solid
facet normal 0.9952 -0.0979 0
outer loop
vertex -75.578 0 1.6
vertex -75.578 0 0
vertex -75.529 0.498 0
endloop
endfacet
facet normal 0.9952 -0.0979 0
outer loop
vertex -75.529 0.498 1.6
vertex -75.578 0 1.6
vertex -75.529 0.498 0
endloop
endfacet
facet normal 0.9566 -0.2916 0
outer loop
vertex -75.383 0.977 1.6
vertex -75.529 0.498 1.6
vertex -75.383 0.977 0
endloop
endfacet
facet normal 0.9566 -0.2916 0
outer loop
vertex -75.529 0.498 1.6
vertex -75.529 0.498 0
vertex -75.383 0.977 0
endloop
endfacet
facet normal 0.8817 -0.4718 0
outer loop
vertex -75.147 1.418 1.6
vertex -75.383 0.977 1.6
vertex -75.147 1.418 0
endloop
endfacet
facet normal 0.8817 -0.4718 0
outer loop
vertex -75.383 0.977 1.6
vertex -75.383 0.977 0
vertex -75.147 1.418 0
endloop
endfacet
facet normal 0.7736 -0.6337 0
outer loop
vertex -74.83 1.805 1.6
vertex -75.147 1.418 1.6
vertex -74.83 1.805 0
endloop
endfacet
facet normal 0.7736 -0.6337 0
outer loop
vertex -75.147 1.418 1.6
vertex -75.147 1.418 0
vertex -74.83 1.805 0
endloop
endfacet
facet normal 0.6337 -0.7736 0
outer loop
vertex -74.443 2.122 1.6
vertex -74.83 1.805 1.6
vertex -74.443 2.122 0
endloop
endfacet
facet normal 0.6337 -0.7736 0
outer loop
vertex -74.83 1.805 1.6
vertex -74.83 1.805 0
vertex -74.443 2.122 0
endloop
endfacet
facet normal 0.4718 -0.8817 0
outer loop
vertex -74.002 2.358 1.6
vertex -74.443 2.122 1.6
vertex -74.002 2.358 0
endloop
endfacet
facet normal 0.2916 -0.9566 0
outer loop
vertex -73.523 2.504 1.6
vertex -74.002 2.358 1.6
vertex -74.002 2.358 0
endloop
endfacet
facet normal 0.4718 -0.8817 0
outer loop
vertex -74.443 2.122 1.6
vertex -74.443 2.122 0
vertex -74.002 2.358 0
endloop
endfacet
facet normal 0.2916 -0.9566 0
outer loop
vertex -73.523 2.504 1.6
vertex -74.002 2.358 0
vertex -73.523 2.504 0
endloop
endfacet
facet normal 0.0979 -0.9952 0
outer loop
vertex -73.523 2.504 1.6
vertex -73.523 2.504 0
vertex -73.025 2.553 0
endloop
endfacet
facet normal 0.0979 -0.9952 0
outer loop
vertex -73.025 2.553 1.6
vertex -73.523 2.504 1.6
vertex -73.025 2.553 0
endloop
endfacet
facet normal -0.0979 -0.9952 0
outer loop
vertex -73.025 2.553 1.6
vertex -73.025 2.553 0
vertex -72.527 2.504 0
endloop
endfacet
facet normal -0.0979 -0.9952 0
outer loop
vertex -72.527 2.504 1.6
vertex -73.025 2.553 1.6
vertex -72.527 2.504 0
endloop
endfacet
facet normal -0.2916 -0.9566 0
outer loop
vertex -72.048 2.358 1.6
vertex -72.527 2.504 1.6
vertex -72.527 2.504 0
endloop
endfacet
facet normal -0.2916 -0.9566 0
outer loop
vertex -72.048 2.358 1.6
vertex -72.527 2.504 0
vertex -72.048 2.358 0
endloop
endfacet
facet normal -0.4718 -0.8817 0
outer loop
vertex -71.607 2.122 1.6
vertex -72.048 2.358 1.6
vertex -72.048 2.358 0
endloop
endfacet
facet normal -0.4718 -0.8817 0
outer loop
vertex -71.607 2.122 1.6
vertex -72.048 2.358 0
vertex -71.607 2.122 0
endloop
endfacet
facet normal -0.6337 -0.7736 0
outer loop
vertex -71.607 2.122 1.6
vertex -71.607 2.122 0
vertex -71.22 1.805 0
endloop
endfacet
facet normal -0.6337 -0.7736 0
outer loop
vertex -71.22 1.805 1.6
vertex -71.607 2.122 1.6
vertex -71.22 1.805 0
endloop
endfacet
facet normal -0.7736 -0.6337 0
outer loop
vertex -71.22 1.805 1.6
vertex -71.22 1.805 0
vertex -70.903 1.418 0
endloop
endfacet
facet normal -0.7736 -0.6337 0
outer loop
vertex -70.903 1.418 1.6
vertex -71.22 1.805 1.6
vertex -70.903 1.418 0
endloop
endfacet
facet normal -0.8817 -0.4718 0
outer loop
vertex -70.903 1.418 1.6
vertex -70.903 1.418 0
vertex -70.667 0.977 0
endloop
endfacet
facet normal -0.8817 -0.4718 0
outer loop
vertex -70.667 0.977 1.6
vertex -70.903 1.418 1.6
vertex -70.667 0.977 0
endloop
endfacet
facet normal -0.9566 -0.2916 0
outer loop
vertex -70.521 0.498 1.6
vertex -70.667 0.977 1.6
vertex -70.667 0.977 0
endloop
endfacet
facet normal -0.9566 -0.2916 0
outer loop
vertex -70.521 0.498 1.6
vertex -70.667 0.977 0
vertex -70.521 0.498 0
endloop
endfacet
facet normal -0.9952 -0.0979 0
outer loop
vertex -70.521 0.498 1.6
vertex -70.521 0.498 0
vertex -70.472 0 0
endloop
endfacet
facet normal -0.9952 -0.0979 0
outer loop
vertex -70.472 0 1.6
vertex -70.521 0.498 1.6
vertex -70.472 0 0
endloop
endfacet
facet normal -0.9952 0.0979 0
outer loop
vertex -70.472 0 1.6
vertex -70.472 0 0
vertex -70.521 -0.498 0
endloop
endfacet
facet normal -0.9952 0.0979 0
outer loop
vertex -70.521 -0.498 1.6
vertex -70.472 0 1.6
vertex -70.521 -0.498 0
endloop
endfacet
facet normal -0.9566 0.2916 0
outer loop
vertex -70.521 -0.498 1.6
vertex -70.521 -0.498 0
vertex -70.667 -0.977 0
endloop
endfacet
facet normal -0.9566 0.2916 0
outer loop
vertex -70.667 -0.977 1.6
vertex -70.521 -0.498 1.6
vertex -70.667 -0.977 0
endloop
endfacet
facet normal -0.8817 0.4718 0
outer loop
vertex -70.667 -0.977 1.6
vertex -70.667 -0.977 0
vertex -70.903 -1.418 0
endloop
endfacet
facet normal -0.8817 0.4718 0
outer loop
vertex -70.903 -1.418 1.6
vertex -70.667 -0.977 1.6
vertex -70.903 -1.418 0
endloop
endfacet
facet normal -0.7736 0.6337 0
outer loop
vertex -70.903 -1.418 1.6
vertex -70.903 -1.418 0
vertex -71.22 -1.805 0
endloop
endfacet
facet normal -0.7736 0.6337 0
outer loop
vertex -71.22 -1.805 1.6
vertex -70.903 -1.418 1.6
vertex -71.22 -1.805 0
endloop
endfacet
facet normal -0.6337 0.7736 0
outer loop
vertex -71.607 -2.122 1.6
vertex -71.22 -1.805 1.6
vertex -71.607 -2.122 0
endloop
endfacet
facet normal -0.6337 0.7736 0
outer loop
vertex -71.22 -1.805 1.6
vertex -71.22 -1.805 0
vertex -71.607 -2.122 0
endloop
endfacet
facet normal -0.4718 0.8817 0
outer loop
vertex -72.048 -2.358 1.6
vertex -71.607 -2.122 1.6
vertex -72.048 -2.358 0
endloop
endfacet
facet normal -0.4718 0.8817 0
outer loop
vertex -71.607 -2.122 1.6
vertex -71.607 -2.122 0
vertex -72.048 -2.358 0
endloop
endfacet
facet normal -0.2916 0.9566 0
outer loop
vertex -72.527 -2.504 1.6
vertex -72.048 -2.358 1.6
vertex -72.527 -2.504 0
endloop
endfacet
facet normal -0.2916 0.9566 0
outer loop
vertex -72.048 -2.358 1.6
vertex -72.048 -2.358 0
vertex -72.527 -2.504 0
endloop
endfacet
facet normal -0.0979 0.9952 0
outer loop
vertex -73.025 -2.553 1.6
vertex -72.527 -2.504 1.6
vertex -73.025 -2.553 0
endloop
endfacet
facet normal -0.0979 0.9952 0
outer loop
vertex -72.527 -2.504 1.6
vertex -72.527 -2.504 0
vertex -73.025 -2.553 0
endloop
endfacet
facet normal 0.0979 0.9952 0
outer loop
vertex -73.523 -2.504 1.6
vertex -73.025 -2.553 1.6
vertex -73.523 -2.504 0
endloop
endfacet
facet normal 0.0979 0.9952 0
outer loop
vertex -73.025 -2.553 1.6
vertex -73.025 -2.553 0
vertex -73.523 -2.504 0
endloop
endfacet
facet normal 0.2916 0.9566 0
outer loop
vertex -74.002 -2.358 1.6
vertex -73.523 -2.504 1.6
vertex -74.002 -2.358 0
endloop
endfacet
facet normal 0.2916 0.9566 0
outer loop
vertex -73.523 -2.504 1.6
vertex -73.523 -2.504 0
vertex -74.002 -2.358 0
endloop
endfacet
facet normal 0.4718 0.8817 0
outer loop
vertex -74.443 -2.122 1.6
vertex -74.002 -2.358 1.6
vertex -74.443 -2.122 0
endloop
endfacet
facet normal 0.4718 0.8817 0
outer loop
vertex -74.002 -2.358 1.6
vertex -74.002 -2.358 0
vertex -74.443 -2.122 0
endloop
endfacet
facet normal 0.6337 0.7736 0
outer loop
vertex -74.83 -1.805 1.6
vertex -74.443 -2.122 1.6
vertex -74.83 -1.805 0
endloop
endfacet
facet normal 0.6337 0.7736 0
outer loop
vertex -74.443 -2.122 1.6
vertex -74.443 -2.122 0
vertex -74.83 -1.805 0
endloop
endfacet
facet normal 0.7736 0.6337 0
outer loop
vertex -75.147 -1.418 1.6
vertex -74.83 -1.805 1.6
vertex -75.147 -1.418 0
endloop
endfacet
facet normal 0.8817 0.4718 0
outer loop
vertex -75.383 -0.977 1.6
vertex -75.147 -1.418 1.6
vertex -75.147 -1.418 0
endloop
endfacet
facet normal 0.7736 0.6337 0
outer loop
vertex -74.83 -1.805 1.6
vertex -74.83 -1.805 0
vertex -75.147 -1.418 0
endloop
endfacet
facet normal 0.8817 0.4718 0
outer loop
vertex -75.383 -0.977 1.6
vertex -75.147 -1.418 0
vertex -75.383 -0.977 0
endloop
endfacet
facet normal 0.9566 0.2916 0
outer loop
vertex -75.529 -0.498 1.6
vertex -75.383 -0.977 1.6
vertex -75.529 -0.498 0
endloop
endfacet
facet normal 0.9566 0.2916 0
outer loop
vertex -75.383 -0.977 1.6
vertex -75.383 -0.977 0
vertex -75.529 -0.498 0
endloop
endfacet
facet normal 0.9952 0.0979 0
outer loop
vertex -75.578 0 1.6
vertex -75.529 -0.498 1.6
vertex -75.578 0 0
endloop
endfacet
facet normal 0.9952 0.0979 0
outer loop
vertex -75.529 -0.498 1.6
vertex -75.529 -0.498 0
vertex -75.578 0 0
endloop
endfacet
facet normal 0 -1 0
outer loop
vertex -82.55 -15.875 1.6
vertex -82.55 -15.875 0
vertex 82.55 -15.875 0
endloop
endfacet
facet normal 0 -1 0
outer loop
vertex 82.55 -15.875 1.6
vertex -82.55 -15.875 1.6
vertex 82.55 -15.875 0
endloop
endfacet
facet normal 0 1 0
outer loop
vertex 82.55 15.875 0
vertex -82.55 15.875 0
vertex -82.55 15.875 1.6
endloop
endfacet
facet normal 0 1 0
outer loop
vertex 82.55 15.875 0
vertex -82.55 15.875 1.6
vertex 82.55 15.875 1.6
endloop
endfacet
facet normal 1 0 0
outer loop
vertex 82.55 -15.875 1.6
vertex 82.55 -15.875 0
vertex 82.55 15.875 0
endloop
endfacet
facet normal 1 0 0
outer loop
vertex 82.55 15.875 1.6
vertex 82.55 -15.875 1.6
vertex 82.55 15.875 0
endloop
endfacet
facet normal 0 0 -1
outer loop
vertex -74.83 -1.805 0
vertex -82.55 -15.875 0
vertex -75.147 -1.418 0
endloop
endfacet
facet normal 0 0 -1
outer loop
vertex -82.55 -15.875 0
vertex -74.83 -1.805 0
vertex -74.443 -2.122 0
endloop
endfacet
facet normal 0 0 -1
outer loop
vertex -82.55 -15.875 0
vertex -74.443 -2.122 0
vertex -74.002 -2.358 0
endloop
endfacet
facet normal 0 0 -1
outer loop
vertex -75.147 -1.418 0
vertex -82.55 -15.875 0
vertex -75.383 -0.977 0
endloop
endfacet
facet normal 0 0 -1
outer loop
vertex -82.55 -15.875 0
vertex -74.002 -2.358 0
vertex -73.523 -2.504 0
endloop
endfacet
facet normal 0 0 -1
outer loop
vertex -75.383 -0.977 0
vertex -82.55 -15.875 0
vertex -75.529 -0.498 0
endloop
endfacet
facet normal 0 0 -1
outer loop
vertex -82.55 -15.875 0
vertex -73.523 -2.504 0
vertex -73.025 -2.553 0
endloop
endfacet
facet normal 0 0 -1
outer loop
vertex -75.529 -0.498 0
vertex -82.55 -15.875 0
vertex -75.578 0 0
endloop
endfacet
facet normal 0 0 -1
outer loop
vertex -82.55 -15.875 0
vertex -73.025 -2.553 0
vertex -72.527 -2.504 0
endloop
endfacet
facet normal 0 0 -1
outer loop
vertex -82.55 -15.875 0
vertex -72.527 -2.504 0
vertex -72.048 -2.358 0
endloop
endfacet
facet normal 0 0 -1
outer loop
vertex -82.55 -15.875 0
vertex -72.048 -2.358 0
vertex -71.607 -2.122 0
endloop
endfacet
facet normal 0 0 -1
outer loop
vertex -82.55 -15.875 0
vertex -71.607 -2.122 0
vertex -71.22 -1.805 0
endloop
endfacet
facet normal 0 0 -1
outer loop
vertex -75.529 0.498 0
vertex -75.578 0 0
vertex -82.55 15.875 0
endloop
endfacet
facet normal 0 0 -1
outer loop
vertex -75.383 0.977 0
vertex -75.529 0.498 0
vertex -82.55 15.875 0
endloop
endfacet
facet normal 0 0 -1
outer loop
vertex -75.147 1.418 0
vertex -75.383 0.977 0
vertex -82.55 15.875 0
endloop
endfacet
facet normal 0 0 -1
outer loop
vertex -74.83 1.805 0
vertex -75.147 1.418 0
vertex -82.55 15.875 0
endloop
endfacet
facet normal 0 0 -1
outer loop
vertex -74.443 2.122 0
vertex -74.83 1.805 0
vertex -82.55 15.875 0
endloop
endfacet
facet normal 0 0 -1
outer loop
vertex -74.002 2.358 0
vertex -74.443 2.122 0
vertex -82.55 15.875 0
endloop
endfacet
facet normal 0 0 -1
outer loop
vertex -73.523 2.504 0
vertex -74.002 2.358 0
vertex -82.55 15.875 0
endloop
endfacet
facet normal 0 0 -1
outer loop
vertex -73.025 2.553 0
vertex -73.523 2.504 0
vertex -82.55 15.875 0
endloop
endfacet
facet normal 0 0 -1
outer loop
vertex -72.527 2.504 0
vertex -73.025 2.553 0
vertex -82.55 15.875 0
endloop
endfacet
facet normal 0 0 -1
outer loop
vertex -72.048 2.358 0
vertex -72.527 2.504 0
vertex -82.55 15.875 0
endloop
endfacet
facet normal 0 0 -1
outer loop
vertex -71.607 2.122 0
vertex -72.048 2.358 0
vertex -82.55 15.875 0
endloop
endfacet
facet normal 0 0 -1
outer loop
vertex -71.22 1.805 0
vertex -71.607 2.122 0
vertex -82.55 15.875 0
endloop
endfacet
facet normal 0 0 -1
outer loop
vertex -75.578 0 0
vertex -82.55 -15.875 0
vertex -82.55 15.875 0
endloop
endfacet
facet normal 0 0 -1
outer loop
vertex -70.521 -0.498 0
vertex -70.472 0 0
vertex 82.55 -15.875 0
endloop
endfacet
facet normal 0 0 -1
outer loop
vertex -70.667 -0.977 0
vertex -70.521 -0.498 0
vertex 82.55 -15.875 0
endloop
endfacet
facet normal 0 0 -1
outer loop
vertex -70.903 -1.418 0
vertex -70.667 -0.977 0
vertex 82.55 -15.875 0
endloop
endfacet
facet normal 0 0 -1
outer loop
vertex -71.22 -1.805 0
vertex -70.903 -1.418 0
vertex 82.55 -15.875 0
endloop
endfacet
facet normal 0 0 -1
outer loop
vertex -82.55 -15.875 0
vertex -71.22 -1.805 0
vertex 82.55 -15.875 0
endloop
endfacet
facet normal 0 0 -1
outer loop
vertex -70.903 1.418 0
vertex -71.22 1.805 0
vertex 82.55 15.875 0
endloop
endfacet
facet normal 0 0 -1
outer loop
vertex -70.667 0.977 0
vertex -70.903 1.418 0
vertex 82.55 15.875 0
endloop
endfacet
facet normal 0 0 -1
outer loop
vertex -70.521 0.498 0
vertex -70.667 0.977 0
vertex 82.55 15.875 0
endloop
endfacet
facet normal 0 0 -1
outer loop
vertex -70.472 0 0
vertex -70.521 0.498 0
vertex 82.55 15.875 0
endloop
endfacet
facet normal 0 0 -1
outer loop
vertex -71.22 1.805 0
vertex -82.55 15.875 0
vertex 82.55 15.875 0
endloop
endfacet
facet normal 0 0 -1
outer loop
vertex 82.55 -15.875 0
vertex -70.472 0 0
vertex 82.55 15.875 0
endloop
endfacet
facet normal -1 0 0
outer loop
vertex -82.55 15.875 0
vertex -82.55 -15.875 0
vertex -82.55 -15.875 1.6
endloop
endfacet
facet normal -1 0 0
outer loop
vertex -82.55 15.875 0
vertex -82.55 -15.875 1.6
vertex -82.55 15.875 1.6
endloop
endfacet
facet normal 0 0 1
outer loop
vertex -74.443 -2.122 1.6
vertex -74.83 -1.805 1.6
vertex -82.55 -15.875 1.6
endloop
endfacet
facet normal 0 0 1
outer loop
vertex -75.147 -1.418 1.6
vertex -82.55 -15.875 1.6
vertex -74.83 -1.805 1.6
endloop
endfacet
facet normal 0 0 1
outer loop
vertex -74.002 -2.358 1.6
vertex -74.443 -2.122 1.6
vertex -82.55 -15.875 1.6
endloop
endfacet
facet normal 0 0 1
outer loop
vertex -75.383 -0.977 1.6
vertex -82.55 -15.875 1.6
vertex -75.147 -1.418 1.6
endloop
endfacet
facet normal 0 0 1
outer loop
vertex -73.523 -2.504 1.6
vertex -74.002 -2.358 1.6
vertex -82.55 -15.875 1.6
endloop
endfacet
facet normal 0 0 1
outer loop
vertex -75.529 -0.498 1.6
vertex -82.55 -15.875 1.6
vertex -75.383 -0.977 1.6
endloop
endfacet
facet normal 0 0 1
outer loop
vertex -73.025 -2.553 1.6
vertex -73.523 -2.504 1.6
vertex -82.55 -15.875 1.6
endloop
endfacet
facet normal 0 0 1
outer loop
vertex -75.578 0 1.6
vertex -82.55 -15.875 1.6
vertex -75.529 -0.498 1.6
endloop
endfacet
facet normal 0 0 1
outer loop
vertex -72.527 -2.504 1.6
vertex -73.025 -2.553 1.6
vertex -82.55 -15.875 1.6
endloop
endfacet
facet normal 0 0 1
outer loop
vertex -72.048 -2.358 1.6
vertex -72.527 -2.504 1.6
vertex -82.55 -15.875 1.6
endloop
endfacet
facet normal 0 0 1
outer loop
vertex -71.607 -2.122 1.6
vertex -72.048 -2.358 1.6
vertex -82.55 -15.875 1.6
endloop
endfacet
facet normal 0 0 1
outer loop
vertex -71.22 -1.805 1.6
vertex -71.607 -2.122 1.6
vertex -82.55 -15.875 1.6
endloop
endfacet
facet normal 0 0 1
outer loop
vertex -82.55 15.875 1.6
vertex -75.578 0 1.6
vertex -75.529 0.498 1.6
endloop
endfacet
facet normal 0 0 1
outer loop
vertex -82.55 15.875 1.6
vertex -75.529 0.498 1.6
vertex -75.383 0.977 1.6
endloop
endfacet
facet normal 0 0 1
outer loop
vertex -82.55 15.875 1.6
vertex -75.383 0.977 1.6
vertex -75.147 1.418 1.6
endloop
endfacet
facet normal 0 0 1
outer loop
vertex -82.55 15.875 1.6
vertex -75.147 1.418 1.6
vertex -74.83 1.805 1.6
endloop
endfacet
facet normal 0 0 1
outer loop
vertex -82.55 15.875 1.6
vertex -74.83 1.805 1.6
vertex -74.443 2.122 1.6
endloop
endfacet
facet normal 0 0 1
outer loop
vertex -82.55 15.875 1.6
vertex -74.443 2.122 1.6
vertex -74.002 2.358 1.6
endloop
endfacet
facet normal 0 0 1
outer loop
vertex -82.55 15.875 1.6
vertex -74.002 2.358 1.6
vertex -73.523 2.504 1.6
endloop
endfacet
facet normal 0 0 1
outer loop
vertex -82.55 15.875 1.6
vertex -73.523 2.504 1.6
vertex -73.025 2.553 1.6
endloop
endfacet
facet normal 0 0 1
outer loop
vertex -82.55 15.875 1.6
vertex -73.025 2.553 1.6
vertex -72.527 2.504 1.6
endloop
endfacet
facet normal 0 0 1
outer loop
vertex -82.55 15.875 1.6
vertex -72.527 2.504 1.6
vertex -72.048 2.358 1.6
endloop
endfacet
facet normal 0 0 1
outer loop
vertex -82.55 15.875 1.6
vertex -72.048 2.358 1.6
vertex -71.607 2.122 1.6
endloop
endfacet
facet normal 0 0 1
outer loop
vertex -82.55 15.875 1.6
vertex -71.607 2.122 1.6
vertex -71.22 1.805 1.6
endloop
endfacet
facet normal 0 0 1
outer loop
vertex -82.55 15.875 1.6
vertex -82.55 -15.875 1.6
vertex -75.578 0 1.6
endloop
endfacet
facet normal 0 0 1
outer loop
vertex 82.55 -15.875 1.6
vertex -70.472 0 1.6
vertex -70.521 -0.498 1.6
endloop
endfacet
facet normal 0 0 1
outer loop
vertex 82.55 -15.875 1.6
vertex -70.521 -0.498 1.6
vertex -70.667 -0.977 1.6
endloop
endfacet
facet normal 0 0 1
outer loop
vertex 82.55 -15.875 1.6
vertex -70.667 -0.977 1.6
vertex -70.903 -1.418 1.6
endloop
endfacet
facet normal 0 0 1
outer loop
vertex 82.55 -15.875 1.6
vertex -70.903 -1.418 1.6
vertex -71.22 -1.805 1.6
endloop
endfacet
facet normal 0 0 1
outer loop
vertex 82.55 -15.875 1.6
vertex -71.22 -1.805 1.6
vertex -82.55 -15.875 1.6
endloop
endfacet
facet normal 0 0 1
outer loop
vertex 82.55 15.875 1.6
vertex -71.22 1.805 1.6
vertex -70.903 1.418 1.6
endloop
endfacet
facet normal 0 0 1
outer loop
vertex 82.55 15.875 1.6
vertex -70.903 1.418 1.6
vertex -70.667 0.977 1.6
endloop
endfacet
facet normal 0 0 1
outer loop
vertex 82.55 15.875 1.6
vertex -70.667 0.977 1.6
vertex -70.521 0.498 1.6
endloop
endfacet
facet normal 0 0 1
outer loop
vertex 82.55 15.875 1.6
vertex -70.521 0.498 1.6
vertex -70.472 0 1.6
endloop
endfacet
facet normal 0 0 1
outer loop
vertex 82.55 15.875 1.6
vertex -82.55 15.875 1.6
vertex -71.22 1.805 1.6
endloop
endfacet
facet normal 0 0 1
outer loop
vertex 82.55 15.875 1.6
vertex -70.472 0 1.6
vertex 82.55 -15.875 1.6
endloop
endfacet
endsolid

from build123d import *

# Parameters (mm, degrees)
SKETCH1_W           = 165.1
SKETCH1_H           = 31.75
BOSS_EXTRUDE1_DEPTH = 1.6002
SKETCH2_R           = 2.5527
CUT_EXTRUDE1_DEPTH  = 2.54


with BuildPart() as part:
    # Sketch1 → Boss-Extrude1 (new body)
    with BuildSketch(Plane.XY):
        Rectangle(SKETCH1_W, SKETCH1_H)
    extrude(amount=BOSS_EXTRUDE1_DEPTH)

    # Sketch2 → Cut-Extrude1 (cut)
    with BuildSketch(Plane(origin=(0, 0, 0), x_dir=(-1, 0, 0), z_dir=(0, 0, -1))):
        with Locations((73.025, 0)):
            Circle(SKETCH2_R)
    extrude(amount=-CUT_EXTRUDE1_DEPTH, mode=Mode.SUBTRACT)


solid = part.part
